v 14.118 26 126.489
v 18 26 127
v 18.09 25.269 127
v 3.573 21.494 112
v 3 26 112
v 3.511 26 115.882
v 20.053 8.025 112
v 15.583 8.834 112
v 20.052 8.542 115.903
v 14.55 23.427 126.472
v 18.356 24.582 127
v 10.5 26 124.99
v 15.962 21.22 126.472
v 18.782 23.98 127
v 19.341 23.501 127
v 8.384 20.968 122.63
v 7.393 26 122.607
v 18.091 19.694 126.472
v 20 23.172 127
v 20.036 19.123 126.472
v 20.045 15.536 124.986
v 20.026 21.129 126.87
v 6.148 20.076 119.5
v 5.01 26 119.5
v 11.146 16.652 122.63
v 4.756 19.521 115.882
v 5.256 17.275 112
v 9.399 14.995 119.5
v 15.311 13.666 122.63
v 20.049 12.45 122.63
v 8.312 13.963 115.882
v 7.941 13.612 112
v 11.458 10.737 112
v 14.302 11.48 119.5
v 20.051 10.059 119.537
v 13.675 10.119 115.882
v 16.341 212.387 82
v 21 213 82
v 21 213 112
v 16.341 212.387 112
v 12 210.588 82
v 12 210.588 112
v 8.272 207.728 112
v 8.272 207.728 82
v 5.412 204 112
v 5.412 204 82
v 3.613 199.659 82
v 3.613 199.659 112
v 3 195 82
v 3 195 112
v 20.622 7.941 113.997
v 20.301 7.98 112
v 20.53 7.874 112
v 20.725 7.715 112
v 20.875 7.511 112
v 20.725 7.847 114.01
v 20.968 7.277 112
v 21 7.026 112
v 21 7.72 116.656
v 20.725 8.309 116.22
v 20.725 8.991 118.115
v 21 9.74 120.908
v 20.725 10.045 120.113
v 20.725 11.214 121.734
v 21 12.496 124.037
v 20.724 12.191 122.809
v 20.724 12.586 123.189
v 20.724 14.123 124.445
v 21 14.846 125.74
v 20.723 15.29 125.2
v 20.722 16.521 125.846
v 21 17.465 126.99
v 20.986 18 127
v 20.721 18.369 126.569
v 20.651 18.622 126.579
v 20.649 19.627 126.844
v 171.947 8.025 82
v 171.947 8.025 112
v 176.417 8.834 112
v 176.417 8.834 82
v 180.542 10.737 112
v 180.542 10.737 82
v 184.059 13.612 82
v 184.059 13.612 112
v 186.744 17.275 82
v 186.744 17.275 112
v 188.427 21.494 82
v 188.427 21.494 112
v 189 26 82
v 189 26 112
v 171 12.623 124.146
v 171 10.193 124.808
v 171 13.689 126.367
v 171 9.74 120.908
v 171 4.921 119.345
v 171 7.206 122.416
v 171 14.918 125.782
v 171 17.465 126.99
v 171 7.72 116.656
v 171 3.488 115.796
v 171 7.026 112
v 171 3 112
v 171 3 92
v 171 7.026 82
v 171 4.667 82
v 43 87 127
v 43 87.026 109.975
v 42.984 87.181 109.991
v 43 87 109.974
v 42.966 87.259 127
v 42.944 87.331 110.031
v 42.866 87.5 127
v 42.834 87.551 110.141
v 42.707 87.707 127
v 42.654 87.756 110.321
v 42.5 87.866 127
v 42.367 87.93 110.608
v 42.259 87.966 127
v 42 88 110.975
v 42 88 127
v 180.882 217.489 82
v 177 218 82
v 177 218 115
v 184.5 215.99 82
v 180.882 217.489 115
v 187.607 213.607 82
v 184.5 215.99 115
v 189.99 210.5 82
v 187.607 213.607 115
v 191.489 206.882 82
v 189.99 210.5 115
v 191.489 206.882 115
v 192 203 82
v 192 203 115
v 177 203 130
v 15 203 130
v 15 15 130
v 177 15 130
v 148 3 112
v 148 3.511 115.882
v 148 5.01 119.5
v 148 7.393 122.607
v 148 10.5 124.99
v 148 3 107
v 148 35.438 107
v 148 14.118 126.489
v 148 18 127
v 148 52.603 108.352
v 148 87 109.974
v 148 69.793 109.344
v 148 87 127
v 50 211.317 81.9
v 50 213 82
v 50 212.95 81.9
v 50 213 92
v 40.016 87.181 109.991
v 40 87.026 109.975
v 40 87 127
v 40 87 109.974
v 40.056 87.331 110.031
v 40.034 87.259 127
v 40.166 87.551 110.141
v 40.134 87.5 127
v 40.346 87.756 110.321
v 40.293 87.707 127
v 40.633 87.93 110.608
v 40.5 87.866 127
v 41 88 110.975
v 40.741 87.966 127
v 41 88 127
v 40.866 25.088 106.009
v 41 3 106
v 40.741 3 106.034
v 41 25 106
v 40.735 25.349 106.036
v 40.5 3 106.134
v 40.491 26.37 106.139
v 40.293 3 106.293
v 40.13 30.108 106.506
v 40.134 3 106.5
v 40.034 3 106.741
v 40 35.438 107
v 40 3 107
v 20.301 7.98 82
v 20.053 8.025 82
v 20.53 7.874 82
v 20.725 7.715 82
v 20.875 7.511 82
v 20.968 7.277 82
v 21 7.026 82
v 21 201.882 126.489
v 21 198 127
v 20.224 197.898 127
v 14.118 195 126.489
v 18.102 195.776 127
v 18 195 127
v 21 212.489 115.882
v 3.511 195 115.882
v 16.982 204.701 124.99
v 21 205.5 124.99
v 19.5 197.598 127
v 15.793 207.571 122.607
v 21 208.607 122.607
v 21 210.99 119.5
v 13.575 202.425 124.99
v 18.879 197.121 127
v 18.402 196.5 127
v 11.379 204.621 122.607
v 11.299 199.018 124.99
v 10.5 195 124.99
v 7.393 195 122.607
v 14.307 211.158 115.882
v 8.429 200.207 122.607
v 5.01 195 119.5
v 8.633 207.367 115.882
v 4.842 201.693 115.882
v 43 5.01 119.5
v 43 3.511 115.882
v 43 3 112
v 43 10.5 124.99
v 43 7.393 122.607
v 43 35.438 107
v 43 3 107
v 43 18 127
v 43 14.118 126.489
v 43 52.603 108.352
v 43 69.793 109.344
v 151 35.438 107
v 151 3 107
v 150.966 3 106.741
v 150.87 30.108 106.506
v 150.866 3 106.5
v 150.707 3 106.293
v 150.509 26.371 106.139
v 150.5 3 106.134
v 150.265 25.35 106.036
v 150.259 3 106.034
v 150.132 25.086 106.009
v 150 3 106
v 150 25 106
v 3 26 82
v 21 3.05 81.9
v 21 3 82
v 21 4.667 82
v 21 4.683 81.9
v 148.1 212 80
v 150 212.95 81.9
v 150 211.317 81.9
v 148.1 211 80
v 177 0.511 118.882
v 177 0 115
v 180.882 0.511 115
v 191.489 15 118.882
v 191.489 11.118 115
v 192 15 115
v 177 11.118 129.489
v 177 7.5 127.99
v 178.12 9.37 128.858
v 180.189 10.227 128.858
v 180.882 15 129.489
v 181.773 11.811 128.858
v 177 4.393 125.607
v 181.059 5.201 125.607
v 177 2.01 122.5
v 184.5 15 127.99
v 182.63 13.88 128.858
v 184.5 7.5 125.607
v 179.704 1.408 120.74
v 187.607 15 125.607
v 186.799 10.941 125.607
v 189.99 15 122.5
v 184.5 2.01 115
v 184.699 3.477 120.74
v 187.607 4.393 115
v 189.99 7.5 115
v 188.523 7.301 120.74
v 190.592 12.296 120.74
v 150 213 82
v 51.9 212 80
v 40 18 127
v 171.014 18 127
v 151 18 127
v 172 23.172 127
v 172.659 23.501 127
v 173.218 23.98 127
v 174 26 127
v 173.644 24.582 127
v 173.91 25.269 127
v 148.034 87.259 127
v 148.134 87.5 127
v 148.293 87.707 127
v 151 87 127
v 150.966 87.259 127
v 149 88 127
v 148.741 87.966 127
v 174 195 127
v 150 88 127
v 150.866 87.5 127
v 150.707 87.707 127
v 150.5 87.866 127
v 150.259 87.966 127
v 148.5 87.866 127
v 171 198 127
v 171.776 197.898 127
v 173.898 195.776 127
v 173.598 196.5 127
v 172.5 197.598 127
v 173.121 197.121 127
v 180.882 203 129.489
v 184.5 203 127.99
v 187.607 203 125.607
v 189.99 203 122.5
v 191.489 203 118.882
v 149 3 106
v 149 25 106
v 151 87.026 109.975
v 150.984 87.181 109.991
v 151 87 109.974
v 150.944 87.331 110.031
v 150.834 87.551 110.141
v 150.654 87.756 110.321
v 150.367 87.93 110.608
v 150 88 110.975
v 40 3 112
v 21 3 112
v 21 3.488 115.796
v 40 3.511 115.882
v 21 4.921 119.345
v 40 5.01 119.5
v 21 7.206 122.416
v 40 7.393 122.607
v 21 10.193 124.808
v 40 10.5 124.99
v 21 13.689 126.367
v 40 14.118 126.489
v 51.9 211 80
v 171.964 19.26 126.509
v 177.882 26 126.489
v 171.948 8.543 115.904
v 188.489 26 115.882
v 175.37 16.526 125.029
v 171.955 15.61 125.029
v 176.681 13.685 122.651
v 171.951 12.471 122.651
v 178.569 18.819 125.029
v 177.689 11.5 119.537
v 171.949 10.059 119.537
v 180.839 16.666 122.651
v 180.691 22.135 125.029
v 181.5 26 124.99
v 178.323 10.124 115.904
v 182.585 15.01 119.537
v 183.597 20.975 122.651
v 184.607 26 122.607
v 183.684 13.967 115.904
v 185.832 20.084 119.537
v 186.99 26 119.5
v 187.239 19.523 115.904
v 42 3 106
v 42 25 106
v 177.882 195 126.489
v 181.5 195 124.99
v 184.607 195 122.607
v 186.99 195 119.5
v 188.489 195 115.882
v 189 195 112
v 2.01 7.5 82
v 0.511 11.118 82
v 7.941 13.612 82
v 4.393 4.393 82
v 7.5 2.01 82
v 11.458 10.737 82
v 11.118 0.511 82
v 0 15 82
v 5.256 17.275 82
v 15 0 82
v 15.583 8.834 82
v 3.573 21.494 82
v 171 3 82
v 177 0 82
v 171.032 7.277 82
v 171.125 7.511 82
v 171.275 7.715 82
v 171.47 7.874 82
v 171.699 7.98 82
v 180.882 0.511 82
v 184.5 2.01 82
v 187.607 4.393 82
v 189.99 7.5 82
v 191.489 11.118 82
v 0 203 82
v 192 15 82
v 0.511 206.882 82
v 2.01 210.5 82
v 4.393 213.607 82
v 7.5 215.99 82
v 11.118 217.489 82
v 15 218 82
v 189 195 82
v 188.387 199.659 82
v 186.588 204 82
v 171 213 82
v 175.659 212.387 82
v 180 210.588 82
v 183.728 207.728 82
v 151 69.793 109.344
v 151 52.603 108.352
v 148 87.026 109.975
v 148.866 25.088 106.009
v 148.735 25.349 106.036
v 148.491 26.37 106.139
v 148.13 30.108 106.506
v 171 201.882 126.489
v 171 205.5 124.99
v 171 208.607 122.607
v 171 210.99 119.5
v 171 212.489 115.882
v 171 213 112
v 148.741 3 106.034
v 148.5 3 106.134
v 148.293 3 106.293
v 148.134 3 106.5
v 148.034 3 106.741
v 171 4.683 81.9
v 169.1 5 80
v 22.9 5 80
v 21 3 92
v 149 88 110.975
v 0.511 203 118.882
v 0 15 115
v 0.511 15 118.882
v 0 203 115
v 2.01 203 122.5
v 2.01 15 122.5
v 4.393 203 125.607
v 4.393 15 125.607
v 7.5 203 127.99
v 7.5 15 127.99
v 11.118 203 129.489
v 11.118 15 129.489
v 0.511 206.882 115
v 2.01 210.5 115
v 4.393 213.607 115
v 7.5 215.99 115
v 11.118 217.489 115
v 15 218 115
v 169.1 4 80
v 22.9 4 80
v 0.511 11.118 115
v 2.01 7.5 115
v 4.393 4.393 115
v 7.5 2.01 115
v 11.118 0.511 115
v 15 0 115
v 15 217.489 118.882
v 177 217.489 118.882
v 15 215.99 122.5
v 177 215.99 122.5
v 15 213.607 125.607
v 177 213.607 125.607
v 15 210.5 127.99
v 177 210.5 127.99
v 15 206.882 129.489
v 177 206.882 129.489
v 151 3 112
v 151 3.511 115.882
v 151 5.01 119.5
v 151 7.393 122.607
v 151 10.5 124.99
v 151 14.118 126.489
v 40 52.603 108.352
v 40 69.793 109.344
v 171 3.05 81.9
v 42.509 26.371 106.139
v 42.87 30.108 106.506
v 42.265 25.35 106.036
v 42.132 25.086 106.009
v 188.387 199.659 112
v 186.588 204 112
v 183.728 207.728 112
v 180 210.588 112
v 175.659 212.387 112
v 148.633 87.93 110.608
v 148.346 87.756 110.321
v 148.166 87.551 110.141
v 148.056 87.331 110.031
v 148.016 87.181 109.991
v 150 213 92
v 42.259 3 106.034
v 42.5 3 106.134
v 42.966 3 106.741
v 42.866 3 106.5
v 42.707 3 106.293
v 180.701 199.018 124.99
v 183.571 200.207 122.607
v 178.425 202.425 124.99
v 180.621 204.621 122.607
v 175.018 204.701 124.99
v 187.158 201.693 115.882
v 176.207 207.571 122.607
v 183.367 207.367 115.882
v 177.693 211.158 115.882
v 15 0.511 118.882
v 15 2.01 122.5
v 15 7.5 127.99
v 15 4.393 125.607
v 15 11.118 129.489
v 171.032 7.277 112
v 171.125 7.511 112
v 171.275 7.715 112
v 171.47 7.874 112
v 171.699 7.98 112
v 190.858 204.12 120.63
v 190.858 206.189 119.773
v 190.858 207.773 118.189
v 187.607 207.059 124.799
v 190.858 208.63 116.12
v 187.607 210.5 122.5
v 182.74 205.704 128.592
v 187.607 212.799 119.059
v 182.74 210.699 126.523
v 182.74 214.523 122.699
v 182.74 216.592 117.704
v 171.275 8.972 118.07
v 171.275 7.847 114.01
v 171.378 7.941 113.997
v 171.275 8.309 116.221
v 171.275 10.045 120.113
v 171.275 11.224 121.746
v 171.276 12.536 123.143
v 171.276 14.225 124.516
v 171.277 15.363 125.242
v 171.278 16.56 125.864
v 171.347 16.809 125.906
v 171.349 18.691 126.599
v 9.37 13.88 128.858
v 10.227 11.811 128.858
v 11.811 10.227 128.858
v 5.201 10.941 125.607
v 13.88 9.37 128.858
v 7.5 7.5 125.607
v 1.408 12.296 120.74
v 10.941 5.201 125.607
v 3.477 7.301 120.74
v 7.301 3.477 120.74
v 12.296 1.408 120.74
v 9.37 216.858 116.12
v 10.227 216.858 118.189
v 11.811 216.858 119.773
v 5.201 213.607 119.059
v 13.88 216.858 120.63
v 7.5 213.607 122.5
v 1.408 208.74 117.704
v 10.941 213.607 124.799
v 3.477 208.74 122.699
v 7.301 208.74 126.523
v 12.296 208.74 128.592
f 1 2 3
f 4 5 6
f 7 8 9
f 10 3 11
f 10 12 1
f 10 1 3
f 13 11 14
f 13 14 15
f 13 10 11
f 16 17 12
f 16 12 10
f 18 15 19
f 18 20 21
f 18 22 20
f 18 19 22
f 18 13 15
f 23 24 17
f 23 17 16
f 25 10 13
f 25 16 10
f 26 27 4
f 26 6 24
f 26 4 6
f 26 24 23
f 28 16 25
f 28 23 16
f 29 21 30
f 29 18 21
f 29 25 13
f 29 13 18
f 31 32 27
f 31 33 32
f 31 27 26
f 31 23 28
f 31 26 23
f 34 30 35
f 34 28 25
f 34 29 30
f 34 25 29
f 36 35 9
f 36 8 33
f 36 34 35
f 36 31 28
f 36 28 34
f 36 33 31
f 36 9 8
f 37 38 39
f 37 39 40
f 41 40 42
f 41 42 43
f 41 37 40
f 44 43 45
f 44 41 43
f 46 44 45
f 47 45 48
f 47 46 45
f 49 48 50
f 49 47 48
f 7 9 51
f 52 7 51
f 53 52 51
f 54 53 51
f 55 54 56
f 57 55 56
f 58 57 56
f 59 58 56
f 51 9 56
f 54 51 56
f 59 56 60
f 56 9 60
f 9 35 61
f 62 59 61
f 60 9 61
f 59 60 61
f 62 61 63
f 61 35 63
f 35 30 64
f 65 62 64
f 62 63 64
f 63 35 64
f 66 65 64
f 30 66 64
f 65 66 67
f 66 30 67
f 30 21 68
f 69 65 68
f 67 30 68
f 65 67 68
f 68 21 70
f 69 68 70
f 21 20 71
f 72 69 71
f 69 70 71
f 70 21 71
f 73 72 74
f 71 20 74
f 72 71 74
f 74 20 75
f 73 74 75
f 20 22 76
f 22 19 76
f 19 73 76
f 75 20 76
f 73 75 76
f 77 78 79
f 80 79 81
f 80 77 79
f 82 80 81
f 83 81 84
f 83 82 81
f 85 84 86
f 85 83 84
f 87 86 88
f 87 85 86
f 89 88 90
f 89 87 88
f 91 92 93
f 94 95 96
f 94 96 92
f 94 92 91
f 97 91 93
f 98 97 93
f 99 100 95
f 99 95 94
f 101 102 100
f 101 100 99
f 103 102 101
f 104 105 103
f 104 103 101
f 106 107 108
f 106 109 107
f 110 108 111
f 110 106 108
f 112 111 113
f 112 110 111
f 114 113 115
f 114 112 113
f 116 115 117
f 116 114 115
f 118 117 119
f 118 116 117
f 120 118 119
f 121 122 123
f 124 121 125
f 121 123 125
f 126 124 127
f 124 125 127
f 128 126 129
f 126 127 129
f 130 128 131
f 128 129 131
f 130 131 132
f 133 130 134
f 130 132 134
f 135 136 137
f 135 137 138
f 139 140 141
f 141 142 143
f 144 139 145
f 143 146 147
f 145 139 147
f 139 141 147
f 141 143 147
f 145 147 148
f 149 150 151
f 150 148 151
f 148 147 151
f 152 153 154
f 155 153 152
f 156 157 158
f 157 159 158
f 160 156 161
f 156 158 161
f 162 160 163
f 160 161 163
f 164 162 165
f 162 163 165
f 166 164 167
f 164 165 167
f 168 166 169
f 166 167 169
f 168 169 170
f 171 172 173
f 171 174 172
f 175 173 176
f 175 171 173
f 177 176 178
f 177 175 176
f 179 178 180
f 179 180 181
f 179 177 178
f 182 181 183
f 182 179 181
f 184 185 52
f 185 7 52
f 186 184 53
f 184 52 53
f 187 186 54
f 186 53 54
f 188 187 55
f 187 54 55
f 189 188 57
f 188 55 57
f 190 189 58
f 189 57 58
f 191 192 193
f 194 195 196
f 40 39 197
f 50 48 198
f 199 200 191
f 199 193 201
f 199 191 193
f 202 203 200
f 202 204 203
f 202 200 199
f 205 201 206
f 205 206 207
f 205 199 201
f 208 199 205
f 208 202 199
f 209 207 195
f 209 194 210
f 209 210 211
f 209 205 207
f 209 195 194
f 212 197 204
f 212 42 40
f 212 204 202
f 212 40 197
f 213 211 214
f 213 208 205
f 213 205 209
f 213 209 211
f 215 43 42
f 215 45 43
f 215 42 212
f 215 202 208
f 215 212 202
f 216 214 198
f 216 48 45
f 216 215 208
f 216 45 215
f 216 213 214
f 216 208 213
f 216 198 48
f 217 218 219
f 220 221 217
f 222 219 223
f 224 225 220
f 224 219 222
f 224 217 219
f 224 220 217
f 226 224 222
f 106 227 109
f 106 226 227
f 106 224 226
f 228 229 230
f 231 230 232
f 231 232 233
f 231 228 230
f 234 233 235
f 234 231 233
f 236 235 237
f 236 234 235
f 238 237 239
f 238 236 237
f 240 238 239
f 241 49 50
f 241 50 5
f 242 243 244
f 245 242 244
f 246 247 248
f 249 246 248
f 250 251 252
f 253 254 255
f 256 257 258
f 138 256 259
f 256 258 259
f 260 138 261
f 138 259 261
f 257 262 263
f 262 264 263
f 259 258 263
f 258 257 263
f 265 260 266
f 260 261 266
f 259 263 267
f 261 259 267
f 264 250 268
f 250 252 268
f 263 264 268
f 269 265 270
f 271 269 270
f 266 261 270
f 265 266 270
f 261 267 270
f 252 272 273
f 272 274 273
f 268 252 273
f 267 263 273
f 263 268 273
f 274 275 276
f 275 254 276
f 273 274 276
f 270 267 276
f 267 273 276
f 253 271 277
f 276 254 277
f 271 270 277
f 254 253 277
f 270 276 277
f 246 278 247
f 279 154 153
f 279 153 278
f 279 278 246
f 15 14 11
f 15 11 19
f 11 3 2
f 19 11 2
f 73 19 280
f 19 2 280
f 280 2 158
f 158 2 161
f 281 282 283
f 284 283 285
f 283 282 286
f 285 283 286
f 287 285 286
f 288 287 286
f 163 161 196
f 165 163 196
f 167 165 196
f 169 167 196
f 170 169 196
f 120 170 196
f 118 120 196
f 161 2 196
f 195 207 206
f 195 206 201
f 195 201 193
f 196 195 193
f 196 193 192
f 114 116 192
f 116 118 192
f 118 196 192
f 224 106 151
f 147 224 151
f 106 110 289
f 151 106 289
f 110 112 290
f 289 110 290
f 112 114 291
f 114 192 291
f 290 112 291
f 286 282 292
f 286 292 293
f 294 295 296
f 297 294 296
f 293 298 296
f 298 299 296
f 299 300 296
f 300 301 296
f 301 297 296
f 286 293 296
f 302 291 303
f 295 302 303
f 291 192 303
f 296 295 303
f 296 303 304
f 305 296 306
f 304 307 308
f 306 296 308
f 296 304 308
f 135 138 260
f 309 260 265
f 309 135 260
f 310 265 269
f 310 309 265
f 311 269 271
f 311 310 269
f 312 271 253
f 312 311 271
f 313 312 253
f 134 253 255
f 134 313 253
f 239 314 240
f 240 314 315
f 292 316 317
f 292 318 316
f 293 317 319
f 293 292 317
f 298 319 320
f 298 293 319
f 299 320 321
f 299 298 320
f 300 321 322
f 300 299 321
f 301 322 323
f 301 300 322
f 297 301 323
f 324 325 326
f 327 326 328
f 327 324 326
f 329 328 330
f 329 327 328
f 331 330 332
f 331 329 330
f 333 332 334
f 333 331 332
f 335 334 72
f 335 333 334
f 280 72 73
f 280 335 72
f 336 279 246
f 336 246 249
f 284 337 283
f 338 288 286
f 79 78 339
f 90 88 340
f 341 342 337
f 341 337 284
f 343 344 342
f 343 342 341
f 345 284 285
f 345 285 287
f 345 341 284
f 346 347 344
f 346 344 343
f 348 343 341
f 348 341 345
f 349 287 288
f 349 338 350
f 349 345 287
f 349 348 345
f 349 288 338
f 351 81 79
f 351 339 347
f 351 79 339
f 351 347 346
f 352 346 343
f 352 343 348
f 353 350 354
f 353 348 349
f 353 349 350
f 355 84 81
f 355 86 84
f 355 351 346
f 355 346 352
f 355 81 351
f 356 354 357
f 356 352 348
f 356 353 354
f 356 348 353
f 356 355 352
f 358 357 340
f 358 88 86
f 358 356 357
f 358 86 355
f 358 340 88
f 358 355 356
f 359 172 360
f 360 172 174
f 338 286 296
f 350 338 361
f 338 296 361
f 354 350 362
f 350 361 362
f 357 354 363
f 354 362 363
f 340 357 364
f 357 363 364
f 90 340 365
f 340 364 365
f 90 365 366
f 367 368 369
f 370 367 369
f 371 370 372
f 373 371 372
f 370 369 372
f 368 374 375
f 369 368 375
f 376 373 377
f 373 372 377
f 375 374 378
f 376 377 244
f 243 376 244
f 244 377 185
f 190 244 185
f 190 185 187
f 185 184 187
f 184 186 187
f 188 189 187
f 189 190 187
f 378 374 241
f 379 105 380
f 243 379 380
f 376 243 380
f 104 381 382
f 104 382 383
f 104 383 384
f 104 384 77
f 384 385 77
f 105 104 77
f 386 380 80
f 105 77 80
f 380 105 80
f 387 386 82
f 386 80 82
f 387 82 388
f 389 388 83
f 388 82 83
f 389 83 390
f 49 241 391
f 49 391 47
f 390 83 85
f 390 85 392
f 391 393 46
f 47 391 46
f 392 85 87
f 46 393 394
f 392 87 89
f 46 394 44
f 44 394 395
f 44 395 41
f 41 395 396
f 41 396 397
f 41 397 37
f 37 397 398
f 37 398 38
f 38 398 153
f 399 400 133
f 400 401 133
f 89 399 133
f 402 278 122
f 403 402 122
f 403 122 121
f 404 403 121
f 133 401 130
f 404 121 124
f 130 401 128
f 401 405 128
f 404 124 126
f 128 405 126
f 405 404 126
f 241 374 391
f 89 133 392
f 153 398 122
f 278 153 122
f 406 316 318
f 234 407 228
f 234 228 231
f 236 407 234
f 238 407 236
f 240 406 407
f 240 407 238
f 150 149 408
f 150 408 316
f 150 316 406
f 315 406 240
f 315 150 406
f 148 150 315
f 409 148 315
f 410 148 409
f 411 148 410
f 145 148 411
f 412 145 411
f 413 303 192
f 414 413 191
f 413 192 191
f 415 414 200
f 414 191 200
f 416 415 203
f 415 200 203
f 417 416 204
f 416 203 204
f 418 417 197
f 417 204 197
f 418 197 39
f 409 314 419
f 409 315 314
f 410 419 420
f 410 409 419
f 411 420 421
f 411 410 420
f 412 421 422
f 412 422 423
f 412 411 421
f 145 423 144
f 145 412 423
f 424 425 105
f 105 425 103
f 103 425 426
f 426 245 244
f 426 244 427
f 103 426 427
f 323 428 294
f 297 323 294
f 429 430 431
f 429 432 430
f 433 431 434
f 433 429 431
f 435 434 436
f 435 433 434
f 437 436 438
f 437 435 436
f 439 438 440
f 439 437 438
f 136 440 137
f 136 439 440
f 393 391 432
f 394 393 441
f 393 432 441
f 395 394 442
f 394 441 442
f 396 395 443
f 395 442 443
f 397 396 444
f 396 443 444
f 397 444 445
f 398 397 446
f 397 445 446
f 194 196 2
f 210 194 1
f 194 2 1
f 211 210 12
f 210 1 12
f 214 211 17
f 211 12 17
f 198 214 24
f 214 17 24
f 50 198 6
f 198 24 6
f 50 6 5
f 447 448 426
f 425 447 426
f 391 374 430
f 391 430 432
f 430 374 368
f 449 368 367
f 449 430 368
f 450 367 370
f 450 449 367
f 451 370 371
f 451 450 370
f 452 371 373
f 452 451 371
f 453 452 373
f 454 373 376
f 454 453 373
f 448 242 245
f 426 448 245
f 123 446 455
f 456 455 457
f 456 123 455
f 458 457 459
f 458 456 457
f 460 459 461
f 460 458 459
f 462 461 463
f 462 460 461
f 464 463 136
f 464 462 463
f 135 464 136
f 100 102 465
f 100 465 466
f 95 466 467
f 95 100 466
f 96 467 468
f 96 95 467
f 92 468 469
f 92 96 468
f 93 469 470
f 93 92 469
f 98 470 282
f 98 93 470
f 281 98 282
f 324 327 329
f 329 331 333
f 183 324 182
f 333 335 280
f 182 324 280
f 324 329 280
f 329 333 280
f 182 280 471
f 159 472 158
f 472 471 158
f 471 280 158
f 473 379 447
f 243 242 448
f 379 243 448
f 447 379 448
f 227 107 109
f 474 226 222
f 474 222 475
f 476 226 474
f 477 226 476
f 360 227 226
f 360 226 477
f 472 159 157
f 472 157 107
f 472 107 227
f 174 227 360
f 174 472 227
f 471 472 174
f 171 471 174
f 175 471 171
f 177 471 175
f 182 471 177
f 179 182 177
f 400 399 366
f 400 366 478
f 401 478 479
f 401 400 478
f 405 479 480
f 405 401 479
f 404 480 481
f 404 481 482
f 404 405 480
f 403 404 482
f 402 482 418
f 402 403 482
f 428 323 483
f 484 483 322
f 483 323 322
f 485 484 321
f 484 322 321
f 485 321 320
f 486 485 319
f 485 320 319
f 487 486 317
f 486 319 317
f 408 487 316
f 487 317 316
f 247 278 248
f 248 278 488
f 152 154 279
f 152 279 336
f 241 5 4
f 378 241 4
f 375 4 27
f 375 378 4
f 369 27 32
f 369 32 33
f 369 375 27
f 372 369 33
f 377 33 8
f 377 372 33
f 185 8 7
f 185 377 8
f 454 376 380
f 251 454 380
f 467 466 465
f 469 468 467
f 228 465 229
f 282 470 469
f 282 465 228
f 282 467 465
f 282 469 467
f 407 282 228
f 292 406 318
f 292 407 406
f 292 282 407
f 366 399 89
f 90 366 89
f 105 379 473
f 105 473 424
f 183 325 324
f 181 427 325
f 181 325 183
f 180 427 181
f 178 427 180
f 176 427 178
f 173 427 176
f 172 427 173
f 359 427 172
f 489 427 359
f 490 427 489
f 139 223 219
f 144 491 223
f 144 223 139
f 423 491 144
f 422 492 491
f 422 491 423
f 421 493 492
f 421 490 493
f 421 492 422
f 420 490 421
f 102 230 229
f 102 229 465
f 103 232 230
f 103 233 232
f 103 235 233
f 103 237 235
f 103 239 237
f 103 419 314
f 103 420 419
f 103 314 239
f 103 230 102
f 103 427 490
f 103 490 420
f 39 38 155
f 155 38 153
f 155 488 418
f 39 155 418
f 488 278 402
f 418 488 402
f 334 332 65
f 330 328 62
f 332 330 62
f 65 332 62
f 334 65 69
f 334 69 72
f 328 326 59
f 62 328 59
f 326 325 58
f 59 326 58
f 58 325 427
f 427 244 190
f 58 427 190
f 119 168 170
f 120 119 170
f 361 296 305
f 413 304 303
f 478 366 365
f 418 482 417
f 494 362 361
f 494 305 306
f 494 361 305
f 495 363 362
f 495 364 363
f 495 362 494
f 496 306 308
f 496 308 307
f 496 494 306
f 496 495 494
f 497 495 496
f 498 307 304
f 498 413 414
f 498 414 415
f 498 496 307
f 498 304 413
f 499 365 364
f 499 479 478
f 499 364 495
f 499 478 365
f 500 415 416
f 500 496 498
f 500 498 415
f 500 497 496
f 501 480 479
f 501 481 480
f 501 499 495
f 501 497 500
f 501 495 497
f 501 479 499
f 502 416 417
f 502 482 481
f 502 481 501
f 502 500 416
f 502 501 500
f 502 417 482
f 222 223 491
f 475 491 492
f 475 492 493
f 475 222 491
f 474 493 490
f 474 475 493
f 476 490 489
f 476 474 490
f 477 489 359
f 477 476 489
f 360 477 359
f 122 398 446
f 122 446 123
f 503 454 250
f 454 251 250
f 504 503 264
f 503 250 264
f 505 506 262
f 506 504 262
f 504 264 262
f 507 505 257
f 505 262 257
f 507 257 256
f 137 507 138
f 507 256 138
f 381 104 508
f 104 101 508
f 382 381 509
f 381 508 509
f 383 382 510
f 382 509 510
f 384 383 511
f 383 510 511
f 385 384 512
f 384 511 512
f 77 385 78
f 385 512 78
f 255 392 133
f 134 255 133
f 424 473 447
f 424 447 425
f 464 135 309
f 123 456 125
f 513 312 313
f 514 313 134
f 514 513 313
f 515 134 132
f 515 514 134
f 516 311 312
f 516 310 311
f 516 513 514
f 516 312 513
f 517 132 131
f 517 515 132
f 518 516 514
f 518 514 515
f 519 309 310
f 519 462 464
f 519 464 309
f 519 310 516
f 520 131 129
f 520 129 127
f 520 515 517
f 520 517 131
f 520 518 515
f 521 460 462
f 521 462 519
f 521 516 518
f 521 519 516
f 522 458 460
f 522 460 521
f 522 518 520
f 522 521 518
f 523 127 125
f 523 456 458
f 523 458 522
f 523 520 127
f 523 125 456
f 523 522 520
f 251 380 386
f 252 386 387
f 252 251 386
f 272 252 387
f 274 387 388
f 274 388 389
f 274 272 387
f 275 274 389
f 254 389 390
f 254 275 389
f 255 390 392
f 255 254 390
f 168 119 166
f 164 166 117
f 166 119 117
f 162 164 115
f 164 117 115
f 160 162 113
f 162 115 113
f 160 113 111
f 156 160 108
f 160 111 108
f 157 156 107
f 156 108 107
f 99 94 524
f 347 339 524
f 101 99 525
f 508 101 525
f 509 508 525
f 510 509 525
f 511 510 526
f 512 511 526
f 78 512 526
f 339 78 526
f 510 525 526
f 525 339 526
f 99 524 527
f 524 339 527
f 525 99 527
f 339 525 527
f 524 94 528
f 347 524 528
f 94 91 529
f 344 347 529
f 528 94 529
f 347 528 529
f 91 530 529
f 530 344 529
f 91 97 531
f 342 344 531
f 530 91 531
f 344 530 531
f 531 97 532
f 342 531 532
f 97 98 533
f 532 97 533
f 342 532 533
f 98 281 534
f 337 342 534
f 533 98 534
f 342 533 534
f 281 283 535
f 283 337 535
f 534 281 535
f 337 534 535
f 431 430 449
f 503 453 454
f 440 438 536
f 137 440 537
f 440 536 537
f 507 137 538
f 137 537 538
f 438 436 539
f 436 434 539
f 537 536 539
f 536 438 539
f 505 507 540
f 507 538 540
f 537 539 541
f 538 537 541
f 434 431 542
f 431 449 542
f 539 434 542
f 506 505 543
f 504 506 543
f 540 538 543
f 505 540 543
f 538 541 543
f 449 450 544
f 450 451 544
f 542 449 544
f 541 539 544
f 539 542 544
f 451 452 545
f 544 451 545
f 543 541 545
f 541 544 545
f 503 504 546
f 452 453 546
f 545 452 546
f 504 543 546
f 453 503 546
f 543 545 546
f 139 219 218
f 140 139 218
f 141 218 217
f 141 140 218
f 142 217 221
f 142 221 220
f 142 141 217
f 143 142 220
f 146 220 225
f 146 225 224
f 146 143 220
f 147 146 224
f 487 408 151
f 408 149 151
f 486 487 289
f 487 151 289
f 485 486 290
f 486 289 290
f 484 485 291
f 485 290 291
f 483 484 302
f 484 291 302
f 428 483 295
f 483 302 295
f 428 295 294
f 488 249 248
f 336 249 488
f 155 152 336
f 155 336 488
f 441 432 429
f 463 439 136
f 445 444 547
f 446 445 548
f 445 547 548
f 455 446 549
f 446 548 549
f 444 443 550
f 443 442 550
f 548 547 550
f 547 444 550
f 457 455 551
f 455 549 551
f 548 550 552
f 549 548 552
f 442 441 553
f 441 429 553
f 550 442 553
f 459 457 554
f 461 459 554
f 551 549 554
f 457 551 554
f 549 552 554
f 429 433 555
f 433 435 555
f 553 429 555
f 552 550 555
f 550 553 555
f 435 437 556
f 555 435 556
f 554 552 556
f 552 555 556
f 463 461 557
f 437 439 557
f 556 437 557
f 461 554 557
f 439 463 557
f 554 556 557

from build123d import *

# Parameters (mm, degrees)
PAD004_DEPTH  = 3
PAD003_DEPTH  = 45
FILLET003_R   = 15
FILLET004_R   = 15
BOX006_W      = 192
BOX006_H      = 218
BOX006_DEPTH  = 48
FILLET005_1_R = 15
FILLET005_2_R = 1
PAD007_DEPTH  = 100
PAD005_DEPTH  = 150
CHAMFER_SIZE  = 1.9


with BuildPart() as leftstand:
    # Sketch004 → Pad004 (new body)
    with BuildSketch(Plane.YZ):
        with BuildLine():
            Line((88, 4), (88, 21))
            Line((88, 21), (3, 21))
            Line((3, 21), (3, 0))
            Line((3, 0), (25, 0))
            ThreePointArc((88, 4), (56.461494, 2.606473), (25, 0))
        make_face()
    extrude(amount=PAD004_DEPTH)


with BuildPart() as leftstand_1:
    # Body004 placement: moved
    add(leftstand.part.moved(Location((40, 0, 106))))


with BuildPart() as fusion002:
    # Body005 base: copy of LeftStand
    add(leftstand_1.part)


with BuildPart() as fusion002_1:
    # Body005 placement: moved
    add(fusion002.part.moved(Location((108, 0, 0))))

    # Fusion002: union LeftStand
    add(leftstand_1.part)


with BuildPart() as fillet004:
    # Sketch003 → Pad003 (new body)
    with BuildSketch(Plane.XY):
        with BuildLine():
            Line((18, 0), (168, 0))
            Line((168, 0), (168, 5))
            ThreePointArc((168, 5), (180.727922, 10.272078), (186, 23))
            Line((186, 192), (186, 23))
            ThreePointArc((186, 192), (180.727922, 204.727922), (168, 210))
            Line((18, 210), (168, 210))
            ThreePointArc((18, 210), (5.272078, 204.727922), (0, 192))
            Line((0, 192), (0, 23))
            ThreePointArc((0, 23), (5.272078, 10.272078), (18, 5))
            Line((18, 0), (18, 5))
        make_face()
    extrude(amount=PAD003_DEPTH)


with BuildPart() as fillet004_1:
    # Body003 placement: moved
    add(fillet004.part.moved(Location((3, 3, 82))))

    # Cut001: cut Fusion002
    add(fusion002_1.part, mode=Mode.SUBTRACT)

    # Fillet003
    fillet003_edges = [fillet004_1.edges().sort_by_distance(p)[0] for p in [
        (8.272078, 207.727922, 127),
        (96, 213, 127),
        (3, 110.5, 127),
        (183.727922, 207.727922, 127),
        (189, 110.5, 127),
        (183.727922, 13.272078, 127),
        (95.5, 3, 127),
        (8.272078, 13.272078, 127),
    ]]
    fillet(fillet003_edges, radius=FILLET003_R)

    # Fillet004
    fillet004_edges = [fillet004_1.edges().sort_by_distance(p)[0] for p in [
        (161, 3, 127),
        (30.5, 3, 127),
    ]]
    fillet(fillet004_edges, radius=FILLET004_R)


with BuildPart() as fillet005:
    # Box006 → Box006 (new body)
    with BuildSketch(Plane.XY.offset(82)):
        with Locations((96, 109)):
            Rectangle(BOX006_W, BOX006_H)
    extrude(amount=BOX006_DEPTH)

    # Cut002: cut Fillet004
    add(fillet004_1.part, mode=Mode.SUBTRACT)

    # Fillet005 1
    fillet005_1_edges = [fillet005.edges().sort_by_distance(p)[0] for p in [
        (0, 0, 106),
        (0, 109, 130),
        (0, 218, 106),
        (192, 0, 106),
        (96, 0, 130),
        (96, 218, 130),
        (192, 109, 130),
        (192, 218, 106),
    ]]
    fillet(fillet005_1_edges, radius=FILLET005_1_R)

    # Fillet005 2
    fillet005_2_edges = [fillet005.edges().sort_by_distance(p)[0] for p in [
        (171, 8, 97),
        (21, 8, 97),
        (151, 88, 118.5),
        (151, 14, 106),
        (148, 14, 106),
        (148, 88, 118.5),
        (43, 88, 118.5),
        (43, 14, 106),
        (40, 14, 106),
        (40, 88, 118.5),
        (149.5, 88, 110),
        (41.5, 88, 110),
    ]]
    fillet(fillet005_2_edges, radius=FILLET005_2_R)


with BuildPart() as locklead002:
    # Sketch007 → Pad007 (new body)
    with BuildSketch(Plane.YZ):
        Polygon((0, 0), (2, 12), (2, 2), (1, 0), align=None)
    extrude(amount=PAD007_DEPTH)


with BuildPart() as locklead002_1:
    # Body008 placement: moved
    add(locklead002.part.moved(Location((50, 211, 80))))


with BuildPart() as lid:
    # Sketch005 → Pad005 (new body)
    with BuildSketch(Plane.YZ):
        Polygon((0, 12), (0, 2), (1, 0), (2, 0), align=None)
    extrude(amount=PAD005_DEPTH)


with BuildPart() as lid_1:
    # Body006 placement: moved
    add(lid.part.moved(Location((21, 3, 80))))

    # Fusion003: union Fillet005, LockLead002
    add(fillet005.part)
    add(locklead002_1.part)

    # Chamfer
    chamfer_edges = [lid_1.edges().sort_by_distance(p)[0] for p in [
        (21, 4.5, 80),
        (171, 4.5, 80),
        (50, 211.5, 80),
        (150, 211.5, 80),
    ]]
    chamfer(chamfer_edges, length=CHAMFER_SIZE)


solid = lid_1.part
